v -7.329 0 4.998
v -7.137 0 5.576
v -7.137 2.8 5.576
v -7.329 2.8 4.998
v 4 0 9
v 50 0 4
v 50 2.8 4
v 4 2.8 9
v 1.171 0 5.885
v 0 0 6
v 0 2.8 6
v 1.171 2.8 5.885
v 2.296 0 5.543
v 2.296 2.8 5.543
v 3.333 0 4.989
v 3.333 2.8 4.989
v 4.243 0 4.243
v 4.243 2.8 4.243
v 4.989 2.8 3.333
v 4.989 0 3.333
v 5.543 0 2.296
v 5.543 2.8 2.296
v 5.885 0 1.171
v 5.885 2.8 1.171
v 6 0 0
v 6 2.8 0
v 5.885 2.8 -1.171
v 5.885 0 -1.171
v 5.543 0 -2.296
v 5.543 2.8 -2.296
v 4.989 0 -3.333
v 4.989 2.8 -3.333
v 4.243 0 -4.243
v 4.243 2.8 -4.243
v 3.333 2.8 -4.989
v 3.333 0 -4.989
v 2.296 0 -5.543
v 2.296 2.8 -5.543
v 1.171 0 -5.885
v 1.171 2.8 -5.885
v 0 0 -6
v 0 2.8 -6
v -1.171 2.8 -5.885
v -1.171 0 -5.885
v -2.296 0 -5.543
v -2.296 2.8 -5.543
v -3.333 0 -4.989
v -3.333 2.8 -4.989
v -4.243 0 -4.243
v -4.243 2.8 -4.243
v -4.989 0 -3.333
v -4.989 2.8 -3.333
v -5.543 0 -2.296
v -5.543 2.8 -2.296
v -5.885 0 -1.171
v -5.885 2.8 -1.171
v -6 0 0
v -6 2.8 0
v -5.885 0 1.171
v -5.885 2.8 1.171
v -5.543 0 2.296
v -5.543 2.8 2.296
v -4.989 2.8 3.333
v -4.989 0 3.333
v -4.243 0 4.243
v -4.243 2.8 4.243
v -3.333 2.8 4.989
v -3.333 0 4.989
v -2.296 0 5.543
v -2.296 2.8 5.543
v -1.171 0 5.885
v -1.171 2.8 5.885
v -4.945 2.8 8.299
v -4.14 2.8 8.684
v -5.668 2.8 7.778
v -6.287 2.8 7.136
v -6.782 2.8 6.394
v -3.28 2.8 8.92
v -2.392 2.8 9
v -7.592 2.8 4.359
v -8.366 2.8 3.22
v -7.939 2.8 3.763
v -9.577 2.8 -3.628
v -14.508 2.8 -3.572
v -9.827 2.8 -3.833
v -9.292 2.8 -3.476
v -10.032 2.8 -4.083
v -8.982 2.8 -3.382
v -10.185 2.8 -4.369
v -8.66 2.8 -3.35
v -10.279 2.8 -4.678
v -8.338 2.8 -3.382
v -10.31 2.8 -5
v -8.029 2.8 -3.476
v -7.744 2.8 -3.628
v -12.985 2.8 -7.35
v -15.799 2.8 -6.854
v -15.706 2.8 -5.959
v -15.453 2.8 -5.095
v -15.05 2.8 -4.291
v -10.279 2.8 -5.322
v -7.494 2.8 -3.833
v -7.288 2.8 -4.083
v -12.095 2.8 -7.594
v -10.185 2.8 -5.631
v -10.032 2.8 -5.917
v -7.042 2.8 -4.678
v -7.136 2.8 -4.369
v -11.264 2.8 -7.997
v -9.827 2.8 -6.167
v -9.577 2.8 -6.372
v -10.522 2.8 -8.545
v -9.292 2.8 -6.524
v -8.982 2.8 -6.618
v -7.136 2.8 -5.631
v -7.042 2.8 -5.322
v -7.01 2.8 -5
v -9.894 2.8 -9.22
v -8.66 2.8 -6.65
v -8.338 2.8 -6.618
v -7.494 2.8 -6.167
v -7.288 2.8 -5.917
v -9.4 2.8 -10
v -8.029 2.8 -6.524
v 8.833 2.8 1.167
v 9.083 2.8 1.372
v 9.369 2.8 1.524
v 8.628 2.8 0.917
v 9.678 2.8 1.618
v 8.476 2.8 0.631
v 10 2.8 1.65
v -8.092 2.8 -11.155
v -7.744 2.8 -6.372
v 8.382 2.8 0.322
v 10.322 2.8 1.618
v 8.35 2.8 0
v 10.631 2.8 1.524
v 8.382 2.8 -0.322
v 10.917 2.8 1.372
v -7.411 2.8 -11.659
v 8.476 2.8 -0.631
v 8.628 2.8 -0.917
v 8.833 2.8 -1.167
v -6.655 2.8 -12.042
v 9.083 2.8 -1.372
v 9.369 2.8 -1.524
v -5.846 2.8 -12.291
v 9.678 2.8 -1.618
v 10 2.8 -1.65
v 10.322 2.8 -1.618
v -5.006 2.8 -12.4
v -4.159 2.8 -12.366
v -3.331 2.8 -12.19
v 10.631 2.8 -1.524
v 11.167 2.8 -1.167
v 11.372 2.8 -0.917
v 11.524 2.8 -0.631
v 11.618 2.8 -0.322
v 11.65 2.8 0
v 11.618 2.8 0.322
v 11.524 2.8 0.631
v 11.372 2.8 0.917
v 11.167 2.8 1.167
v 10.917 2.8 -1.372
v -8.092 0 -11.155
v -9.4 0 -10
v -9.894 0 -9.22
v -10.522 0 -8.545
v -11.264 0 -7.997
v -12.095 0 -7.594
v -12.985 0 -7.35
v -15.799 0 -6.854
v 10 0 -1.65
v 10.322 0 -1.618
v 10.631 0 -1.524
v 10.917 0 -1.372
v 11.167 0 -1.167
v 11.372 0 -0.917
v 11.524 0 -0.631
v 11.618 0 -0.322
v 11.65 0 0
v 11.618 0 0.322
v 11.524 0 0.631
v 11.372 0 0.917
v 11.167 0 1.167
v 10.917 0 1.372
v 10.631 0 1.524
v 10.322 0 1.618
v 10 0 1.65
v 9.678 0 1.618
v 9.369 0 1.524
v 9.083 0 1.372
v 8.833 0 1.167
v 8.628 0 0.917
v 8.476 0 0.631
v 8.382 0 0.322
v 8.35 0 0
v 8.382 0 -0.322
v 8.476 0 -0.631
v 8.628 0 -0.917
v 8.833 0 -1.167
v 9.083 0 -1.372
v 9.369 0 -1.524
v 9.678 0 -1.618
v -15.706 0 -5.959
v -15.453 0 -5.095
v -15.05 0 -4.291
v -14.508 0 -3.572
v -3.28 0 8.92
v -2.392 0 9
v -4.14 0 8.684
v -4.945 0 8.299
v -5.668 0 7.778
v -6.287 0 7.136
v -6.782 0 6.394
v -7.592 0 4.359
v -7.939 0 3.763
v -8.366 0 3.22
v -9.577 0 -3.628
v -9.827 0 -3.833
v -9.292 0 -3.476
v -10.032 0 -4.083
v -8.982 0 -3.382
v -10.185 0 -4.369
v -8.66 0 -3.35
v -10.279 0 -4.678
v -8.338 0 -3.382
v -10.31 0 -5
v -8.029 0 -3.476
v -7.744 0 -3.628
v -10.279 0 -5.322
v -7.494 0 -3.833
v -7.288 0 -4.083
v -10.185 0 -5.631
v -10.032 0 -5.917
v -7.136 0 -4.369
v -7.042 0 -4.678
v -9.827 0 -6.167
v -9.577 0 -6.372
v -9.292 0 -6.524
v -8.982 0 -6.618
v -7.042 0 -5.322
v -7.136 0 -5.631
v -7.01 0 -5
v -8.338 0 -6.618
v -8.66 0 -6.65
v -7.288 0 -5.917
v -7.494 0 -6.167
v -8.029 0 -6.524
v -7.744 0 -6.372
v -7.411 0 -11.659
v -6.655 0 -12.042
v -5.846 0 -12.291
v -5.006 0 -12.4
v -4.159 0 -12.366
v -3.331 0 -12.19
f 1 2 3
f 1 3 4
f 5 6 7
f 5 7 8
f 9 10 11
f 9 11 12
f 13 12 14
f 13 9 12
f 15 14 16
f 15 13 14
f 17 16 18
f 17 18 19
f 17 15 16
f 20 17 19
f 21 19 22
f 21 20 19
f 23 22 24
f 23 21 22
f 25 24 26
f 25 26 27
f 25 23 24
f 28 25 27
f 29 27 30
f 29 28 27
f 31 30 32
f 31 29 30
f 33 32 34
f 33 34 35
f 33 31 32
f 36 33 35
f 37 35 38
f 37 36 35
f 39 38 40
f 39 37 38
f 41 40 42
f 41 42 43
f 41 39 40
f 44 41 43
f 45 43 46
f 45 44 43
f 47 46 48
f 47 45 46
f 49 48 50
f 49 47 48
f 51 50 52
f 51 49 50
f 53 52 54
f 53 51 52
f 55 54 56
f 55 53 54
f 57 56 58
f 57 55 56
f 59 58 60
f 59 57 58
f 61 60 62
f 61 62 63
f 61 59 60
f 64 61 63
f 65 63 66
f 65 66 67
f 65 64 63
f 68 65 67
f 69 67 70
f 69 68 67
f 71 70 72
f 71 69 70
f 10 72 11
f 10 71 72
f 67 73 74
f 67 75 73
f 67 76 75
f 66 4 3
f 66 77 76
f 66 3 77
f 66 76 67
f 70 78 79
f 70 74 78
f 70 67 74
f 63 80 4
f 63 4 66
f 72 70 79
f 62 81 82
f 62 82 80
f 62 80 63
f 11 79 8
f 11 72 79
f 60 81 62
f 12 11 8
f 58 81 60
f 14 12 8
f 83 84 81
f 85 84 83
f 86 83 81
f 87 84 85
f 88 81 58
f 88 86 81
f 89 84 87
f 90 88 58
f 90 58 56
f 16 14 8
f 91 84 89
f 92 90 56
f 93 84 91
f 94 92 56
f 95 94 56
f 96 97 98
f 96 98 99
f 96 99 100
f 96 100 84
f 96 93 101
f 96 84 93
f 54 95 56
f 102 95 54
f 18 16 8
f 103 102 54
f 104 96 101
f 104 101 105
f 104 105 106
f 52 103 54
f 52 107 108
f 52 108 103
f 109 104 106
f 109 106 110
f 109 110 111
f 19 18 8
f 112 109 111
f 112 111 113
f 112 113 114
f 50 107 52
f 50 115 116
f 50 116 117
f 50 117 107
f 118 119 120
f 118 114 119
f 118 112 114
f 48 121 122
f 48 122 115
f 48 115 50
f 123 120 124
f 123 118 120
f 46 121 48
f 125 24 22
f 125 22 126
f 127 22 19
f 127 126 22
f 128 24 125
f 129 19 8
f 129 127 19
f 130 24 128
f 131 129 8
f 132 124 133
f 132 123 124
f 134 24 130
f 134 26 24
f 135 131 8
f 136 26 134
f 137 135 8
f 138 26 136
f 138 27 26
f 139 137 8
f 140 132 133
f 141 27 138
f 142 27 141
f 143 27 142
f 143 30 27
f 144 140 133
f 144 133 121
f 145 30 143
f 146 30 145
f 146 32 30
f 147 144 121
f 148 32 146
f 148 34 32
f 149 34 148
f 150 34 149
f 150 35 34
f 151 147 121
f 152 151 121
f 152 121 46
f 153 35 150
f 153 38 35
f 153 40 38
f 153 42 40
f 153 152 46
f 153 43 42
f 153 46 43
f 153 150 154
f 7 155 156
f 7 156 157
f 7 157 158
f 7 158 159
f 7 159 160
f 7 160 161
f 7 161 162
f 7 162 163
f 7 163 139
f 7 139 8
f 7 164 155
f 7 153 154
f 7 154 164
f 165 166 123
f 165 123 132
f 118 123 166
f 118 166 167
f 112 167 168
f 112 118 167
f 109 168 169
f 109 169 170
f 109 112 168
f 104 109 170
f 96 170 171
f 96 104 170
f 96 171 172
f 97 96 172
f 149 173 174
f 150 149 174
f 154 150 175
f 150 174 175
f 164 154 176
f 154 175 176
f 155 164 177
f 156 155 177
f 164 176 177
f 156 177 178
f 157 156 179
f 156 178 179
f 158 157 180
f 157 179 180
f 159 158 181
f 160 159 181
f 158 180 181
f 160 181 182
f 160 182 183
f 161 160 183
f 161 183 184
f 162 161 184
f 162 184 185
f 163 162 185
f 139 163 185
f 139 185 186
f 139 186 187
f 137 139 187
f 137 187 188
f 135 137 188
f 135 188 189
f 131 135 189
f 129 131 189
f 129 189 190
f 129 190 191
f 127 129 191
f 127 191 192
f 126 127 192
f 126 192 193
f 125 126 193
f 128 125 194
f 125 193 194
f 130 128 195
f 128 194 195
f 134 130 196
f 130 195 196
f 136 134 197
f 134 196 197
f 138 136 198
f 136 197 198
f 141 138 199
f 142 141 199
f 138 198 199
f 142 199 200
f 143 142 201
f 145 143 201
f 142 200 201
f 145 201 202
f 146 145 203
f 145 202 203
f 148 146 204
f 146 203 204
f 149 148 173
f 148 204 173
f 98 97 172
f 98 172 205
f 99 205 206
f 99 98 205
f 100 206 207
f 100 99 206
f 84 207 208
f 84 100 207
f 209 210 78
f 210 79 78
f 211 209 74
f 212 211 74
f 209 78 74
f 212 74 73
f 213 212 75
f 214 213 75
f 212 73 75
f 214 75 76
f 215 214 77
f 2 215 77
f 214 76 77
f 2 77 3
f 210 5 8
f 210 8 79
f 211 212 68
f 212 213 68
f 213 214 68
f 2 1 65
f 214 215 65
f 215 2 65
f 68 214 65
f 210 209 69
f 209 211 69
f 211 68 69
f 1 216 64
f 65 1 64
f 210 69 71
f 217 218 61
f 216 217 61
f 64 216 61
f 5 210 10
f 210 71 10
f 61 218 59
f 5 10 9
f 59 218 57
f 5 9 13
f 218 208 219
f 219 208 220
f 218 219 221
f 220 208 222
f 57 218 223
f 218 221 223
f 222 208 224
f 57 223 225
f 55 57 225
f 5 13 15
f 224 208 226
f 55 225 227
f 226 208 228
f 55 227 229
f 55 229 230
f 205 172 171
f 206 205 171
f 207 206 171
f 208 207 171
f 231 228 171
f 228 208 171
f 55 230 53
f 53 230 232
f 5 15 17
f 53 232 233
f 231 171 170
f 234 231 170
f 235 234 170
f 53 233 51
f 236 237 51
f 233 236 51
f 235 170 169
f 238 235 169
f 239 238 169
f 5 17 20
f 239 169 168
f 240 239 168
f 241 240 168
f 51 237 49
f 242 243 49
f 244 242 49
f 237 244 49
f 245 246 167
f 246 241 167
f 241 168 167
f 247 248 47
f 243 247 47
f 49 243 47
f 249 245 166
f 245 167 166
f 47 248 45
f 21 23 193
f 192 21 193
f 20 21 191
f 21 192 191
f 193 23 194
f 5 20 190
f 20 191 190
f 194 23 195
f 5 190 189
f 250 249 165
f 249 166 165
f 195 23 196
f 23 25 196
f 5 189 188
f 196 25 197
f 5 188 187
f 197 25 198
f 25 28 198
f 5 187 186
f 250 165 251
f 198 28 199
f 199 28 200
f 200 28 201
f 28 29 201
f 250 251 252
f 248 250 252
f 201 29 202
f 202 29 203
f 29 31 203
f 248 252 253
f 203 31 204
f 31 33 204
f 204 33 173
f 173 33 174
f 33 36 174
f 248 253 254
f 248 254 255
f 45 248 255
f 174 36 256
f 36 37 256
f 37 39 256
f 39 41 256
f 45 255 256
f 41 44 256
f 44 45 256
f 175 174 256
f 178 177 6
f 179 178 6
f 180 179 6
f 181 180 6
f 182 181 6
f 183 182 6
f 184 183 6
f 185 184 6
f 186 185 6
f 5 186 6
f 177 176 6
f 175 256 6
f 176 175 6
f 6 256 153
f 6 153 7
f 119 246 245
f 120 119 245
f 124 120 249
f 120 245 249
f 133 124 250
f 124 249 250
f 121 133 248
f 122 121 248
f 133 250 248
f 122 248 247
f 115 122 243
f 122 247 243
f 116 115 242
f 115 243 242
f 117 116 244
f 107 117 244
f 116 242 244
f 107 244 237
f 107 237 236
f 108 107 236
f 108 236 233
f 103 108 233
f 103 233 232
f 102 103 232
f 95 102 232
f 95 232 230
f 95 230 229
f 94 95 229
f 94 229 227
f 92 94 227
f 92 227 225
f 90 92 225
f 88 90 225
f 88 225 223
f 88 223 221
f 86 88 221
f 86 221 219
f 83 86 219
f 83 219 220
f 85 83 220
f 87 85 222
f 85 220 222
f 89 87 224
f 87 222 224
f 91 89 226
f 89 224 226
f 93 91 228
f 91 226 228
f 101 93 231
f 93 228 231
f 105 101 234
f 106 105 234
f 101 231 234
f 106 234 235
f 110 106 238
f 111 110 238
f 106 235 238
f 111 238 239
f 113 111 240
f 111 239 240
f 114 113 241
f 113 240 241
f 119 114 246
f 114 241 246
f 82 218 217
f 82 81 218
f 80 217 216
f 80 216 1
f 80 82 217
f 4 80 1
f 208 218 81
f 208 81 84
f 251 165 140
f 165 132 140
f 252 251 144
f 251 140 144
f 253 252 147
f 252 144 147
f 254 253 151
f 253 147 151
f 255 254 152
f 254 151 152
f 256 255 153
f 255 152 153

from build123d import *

# Parameters (mm, degrees)
SKETCH1_R           = 6
BOSS_EXTRUDE3_DEPTH = 2.8
FILLET1_R           = 5
SKETCH5_R           = 1.65
CUT_EXTRUDE2_DEPTH  = 10
CHAMFER1_SIZE       = 6.5
CHAMFER1_SIZE_2     = 1.146125375
FILLET2_R           = 5


with BuildPart() as part:
    # Sketch1 → Boss-Extrude3 (new body)
    with BuildSketch(Plane(origin=(0, 0, 0), x_dir=(1, 0, 0), z_dir=(0, 1, 0))):
        Polygon((-9.4, 10), (-6, 13), (50, -4), (4, -9), (-6, -9), (-7.660869565, -4), (-15.8, 5), (-15.8, 8), (-9.4, 8), align=None)
        with Locations(Location((0, 0, 0), (0, 0, 270))):
            Circle(SKETCH1_R, mode=Mode.SUBTRACT)
    extrude(amount=BOSS_EXTRUDE3_DEPTH)

    # Fillet1
    fillet1_edges = [part.edges().sort_by_distance(p)[0] for p in [
        (-6, 1.4, -13),
        (-6, 1.4, 9),
        (-7.660869565, 1.4, 4),
        (-15.8, 1.4, -5),
    ]]
    fillet(fillet1_edges, radius=FILLET1_R)

    # Sketch5 → Cut-Extrude2 (cut)
    with BuildSketch(Plane.XZ):
        with Locations(Location((10, 0, 0), (0, 0, 270))):
            Circle(SKETCH5_R)
        with Locations(Location((-8.660254038, -5, 0), (0, 0, 270))):
            Circle(SKETCH5_R)
    extrude(amount=-CUT_EXTRUDE2_DEPTH, mode=Mode.SUBTRACT)

    # Chamfer1
    # the kernel refuses this chamfer: 6.5, 1.146125375 mm, written as the material it takes off along each edge
    with BuildSketch(Plane(origin=(-15.8, -16.890502177, -8), x_dir=(0.9999776716360547, 0, -0.006682531656101837), z_dir=(0, 1, 0))) as chamfer1_piece_1_section:
        Polygon((CHAMFER1_SIZE * 0.999977671636, -CHAMFER1_SIZE * 0.0066825316561), (-CHAMFER1_SIZE_2 * 0.0066825316538, -CHAMFER1_SIZE_2 * 0.999977671291), (0, 0), align=None)
    chamfer1_piece_1 = extrude(amount=36.581004353, mode=Mode.PRIVATE)
    chamfer1_piece_1 = split(chamfer1_piece_1, bisect_by=Plane(origin=(-9.4, 1.4, -7.685869002), z_dir=(-1, 0, 0)), keep=Keep.TOP, mode=Mode.PRIVATE)
    add(chamfer1_piece_1, mode=Mode.SUBTRACT)

    # Fillet2
    # the kernel refuses this fillet: 5 mm, written as the material it adds along each edge
    with BuildSketch(Plane(origin=(-9.4, 2.8, -7.982367302), x_dir=(-0.984807753012237, 0, 0.1736481776667665), z_dir=(0, -1, 0))) as fillet2_piece_1:
        with BuildLine():
            CenterArc((3.639843813, 5), FILLET2_R, 217.056619291, 52.943380709)
            Line((-0.350358241, 1.986980324), (-0.430162282, 1.92671993))
            ThreePointArc((-0.430162282, 1.92671993), (-0.273659896, 0.976125344), (-0.098480775, -0.017364818))
            Line((-0.098480775, -0.017364818), (0, -0.1))
            Line((0, -0.1), (3.639843813, -0.1))
            Line((3.639843813, -0.1), (3.639843813, 0))
        make_face()
    extrude(amount=2.8)


solid = part.part
